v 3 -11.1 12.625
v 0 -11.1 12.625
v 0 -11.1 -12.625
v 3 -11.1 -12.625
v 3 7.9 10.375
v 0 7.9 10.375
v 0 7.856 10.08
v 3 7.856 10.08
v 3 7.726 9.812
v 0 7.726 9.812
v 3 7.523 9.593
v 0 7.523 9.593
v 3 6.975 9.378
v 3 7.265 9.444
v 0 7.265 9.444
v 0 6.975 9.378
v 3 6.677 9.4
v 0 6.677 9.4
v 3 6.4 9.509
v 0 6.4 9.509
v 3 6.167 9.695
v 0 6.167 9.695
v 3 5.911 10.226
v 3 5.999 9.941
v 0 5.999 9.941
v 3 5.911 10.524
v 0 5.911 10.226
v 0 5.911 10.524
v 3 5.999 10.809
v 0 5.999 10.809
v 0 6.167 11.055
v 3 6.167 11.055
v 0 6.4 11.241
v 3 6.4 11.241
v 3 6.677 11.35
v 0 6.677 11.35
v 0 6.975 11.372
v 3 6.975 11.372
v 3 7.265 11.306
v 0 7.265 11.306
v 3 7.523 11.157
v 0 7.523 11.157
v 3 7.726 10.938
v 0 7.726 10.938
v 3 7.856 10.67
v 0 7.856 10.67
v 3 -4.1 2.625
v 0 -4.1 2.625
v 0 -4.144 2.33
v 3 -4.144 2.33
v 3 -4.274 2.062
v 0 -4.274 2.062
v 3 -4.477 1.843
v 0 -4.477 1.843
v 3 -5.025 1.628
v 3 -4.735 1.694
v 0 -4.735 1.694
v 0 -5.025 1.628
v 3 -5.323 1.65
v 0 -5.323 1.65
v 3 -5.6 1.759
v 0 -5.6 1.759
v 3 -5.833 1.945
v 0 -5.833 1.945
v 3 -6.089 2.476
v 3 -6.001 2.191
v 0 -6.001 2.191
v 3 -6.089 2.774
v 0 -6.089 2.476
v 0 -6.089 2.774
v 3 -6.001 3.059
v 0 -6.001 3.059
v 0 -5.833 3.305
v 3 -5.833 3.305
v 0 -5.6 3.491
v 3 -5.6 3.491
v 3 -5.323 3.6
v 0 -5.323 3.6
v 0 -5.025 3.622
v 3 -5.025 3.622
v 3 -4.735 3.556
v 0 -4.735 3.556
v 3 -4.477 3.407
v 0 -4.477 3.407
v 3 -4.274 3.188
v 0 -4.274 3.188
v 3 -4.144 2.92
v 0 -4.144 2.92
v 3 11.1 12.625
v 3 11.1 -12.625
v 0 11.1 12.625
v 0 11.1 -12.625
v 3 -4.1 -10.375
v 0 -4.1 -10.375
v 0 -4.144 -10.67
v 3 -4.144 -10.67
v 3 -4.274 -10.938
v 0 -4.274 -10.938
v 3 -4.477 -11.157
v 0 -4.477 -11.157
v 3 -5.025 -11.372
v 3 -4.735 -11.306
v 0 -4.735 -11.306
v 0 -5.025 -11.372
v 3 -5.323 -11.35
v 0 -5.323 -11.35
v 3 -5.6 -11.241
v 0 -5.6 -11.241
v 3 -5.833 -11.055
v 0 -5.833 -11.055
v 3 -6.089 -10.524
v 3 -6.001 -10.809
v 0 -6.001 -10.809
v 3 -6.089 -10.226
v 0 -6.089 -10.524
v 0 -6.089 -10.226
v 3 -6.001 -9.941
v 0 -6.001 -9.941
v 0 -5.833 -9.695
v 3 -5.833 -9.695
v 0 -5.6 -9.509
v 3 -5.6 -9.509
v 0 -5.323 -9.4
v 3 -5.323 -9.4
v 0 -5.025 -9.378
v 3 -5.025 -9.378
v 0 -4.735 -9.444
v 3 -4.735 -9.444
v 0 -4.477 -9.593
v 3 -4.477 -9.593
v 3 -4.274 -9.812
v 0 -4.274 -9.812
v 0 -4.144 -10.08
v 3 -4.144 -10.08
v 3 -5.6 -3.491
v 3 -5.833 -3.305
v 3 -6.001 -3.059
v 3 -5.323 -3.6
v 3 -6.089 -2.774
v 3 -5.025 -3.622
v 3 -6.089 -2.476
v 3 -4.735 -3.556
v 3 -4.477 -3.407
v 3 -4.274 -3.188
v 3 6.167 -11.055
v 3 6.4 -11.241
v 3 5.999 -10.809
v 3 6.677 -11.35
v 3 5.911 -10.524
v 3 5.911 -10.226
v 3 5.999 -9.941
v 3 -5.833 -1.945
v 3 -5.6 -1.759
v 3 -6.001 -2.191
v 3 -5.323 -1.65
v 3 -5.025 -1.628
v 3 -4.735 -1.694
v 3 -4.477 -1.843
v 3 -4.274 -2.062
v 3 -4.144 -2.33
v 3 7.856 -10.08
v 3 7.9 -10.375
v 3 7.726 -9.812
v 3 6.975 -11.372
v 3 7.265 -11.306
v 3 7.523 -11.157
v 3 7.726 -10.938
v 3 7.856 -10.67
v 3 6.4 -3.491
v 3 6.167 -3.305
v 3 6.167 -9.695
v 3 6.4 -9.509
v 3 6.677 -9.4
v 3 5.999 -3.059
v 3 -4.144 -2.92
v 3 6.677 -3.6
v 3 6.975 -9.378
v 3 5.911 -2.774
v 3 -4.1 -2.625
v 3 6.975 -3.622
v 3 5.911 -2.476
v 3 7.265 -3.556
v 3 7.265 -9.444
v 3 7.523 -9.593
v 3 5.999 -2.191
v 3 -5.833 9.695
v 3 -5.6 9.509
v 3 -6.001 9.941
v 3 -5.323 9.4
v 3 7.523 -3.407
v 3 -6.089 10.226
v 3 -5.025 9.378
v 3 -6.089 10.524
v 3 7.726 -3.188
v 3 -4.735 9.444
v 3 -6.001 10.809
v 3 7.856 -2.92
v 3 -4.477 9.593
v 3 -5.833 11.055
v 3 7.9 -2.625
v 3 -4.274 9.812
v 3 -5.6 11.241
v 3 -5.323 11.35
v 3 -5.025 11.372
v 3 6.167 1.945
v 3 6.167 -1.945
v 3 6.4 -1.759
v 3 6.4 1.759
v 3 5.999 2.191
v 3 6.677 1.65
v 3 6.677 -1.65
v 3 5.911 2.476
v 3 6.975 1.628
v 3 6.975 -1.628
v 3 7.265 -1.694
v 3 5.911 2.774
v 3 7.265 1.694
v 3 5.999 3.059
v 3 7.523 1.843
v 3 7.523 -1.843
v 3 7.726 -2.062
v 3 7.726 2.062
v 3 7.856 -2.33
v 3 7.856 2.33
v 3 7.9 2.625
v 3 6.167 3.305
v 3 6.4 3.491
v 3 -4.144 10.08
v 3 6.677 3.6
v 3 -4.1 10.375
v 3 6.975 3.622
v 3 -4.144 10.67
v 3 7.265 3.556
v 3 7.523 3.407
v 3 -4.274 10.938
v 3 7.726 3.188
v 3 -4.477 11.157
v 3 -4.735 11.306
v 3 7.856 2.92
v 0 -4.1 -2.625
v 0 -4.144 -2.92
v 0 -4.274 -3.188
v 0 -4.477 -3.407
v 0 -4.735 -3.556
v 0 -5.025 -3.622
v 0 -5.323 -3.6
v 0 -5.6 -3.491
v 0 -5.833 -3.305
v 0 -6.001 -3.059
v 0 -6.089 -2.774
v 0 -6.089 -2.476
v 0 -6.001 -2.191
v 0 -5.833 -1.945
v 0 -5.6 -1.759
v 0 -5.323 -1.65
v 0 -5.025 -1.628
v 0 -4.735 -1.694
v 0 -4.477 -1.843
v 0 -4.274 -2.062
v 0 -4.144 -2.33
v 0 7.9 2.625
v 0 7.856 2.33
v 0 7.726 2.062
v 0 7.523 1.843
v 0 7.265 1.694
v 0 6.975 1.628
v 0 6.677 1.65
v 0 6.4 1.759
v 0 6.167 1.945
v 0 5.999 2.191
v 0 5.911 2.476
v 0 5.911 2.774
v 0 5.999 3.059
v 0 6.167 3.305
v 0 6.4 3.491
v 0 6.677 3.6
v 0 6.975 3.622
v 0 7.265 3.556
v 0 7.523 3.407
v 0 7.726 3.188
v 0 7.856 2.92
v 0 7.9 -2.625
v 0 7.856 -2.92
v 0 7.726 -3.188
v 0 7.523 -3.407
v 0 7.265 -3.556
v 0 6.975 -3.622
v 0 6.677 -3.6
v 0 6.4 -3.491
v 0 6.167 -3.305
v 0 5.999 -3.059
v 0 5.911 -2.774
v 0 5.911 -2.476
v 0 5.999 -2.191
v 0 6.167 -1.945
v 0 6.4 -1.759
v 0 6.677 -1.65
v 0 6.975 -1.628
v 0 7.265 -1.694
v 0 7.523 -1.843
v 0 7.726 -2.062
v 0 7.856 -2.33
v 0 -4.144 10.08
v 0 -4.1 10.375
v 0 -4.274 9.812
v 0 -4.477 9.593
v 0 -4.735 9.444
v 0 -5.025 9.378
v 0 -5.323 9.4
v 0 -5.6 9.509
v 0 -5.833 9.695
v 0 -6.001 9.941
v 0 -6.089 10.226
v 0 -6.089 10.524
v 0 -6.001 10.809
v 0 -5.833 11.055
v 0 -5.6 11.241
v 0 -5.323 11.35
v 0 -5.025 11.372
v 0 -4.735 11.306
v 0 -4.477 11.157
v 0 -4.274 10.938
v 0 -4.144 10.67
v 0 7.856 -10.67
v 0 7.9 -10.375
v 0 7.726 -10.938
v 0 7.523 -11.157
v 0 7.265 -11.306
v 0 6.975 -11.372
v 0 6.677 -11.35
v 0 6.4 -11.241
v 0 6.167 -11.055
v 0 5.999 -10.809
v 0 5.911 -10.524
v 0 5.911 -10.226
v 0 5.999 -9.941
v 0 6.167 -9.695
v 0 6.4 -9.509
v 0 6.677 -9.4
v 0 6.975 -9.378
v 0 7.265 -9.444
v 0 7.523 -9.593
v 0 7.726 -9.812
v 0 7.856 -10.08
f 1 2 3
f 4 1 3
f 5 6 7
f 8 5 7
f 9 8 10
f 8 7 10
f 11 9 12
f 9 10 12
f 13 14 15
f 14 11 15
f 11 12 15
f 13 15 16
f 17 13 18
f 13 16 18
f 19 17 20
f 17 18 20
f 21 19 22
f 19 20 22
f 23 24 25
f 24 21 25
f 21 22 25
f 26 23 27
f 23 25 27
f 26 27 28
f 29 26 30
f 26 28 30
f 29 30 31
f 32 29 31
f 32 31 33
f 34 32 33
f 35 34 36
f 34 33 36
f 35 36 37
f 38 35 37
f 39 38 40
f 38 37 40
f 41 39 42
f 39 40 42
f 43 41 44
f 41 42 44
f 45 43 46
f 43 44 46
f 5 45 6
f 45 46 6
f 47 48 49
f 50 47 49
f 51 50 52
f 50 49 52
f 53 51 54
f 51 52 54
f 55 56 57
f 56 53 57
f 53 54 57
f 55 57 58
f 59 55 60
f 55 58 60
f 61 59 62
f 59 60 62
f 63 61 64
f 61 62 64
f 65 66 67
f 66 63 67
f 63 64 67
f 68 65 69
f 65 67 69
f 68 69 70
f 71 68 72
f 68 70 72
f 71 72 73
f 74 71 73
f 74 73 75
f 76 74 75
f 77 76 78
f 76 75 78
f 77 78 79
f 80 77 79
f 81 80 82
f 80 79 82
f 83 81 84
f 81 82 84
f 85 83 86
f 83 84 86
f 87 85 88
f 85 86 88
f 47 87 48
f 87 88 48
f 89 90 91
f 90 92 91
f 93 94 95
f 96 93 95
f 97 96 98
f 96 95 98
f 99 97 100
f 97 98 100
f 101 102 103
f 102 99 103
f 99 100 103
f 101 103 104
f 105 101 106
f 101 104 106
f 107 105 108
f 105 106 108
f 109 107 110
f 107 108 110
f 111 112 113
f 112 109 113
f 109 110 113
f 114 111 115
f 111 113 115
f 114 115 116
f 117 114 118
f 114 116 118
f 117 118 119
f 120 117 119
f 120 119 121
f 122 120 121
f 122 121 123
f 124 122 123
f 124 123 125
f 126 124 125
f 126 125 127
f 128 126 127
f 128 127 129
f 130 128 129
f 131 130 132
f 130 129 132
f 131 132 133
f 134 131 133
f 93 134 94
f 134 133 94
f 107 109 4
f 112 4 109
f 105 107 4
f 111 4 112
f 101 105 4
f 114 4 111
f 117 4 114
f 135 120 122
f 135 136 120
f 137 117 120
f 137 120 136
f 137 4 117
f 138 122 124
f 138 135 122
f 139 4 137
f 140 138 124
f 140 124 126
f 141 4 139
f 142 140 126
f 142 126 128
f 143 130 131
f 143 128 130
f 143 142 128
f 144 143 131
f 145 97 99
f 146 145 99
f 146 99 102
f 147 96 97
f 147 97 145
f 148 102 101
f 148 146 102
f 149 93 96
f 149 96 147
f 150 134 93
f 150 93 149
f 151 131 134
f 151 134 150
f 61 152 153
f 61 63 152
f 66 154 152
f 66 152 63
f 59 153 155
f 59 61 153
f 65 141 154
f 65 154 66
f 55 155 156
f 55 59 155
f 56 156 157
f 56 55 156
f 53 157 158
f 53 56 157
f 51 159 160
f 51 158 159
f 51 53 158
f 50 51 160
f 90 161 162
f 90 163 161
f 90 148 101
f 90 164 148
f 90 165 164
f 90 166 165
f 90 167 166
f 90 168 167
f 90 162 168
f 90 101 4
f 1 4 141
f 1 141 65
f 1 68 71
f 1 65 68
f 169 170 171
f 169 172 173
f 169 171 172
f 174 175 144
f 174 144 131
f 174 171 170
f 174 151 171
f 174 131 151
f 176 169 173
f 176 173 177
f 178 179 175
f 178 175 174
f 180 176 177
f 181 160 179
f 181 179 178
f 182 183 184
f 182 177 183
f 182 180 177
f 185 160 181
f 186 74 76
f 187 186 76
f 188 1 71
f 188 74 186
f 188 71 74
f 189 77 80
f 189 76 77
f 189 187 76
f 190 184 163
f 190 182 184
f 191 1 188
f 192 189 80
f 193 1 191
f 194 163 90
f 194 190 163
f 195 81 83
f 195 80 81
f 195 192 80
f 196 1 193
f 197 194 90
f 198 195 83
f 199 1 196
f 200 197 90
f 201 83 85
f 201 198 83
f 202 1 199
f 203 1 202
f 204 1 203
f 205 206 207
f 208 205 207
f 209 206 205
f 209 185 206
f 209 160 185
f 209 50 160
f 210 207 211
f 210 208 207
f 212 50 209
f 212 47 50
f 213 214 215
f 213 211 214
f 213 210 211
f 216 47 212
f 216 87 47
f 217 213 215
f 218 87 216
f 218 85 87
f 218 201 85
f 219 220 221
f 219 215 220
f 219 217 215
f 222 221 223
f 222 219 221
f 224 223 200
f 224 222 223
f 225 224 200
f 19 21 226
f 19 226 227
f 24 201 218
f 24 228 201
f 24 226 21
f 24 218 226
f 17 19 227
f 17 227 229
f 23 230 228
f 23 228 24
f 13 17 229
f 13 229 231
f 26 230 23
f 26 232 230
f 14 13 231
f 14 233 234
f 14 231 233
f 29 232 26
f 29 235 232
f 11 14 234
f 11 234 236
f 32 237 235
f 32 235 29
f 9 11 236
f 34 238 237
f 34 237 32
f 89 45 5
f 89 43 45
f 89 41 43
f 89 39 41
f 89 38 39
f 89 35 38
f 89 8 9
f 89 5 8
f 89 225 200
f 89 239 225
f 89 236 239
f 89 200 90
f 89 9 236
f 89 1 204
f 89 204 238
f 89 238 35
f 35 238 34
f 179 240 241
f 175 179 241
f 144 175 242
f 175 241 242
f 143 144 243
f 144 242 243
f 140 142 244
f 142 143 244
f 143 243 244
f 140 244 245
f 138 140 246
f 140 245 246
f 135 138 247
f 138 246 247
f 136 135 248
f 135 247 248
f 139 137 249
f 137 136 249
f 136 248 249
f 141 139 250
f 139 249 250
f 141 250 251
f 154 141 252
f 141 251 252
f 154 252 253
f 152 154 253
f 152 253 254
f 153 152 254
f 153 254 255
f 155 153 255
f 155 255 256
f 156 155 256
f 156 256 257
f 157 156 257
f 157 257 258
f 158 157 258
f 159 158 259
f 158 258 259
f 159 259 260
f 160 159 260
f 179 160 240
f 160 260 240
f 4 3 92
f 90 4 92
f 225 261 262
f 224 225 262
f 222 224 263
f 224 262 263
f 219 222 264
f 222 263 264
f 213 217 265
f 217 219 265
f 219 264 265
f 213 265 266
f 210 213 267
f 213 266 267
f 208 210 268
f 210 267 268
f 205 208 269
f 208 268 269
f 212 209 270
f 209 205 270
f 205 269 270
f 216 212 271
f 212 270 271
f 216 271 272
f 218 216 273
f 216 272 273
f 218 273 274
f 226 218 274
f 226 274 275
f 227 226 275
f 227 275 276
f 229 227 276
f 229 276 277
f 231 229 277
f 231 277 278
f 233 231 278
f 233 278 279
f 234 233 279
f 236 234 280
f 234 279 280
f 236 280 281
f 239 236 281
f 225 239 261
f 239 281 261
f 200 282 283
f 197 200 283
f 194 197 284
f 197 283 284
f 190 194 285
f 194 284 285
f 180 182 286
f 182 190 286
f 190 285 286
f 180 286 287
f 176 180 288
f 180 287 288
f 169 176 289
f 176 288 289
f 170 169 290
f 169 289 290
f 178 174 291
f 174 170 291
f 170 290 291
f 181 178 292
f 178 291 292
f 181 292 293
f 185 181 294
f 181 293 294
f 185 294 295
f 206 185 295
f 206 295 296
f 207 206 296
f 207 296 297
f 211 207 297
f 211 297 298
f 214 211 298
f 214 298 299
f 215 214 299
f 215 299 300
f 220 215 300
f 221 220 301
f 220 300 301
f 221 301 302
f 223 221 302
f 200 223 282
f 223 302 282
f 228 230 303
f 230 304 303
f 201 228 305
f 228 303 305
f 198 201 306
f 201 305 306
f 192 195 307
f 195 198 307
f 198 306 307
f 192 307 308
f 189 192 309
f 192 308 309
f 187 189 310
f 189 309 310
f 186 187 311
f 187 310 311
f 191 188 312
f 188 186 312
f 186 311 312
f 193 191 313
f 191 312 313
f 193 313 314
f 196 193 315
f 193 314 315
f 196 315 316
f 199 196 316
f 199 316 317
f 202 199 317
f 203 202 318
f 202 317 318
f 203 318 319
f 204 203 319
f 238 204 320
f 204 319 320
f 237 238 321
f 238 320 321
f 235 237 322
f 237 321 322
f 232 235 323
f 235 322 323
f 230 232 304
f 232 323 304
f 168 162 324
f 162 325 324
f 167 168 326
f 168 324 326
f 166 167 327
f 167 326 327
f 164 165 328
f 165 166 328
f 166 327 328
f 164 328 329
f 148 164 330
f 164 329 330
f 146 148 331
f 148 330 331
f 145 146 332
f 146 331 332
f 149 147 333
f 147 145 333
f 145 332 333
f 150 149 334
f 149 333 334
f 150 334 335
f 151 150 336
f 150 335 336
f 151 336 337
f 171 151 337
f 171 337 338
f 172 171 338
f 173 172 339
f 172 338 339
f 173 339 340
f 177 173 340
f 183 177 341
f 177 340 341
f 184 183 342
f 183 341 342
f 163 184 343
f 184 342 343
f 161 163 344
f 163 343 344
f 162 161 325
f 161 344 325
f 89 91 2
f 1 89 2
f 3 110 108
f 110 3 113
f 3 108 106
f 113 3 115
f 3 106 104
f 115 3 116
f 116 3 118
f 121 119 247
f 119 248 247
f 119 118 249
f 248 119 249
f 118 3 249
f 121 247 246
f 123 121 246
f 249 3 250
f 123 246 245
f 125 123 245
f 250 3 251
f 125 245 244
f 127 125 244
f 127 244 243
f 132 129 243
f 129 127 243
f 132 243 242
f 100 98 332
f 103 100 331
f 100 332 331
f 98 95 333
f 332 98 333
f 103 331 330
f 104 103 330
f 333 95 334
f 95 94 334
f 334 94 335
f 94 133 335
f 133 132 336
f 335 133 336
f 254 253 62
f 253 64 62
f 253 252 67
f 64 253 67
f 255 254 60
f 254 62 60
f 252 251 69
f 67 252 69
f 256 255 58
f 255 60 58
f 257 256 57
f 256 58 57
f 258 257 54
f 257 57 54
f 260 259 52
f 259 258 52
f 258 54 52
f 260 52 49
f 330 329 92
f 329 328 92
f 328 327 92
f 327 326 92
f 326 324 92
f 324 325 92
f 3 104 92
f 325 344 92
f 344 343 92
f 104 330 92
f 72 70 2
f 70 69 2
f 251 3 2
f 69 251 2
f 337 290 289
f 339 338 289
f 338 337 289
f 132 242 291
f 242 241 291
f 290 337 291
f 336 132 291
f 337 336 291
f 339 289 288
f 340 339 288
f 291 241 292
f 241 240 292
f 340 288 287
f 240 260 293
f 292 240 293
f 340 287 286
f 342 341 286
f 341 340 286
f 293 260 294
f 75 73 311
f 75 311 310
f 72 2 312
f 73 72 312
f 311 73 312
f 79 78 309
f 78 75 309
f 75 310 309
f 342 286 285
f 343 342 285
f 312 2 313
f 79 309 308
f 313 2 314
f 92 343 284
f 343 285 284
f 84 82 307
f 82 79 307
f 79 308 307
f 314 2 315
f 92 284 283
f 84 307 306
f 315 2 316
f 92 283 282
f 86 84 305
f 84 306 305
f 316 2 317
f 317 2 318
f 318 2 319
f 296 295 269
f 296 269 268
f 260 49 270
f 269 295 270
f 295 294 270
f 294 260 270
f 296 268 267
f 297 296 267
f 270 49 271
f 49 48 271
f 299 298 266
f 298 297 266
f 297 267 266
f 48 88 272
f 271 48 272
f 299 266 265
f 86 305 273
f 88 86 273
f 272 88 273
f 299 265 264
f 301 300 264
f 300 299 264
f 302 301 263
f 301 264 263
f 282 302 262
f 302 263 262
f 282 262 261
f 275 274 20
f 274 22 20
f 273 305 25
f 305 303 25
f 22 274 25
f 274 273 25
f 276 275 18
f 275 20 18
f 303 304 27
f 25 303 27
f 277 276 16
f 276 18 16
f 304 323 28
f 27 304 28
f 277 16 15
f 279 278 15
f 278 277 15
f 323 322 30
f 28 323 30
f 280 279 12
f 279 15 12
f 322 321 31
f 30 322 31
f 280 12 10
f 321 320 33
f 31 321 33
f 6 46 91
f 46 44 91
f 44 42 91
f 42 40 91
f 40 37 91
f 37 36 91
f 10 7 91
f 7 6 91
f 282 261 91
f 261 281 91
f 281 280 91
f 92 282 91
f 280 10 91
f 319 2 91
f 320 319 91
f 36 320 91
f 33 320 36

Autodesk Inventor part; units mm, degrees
ref_plane "YZ Plane" through (0, 0, 0) normal (1, 0, 0) x (0, 1, 0)
ref_plane "XZ Plane" through (0, 0, 0) normal (0, 1, 0) x (-1, 0, 0)
ref_plane "XY Plane" through (0, 0, 0) normal (0, 0, 1) x (1, 0, 0)
sketch "Sketch1" plane through (0, 0, 0) normal (1, 0, 0) x (0, 1, 0)
  line L0 (11.1, 12.625) -> (-11.1, 12.625)
  line L1 (-11.1, 12.625) -> (-11.1, -12.625)
  line L2 (-11.1, -12.625) -> (11.1, -12.625)
  line L3 (11.1, -12.625) -> (11.1, 12.625)
  line L4 (7.1853, 0) -> (-6.35, 0) construction
  line L5 (0, 7.4808) -> (0, -6.6937) construction
  circle A0 centre (-5.1, 10.375) radius 1
  circle A1 centre (-5.1, 2.625) radius 1
  circle A2 centre (-5.1, -10.375) radius 1
  circle A3 centre (-5.1, -2.625) radius 1
  circle A4 centre (6.9, 10.375) radius 1
  circle A5 centre (6.9, -10.375) radius 1
  circle A6 centre (6.9, 2.625) radius 1
  circle A7 centre (6.9, -2.625) radius 1
  point P0 (0, 0)
  dimension "d0" = 22.2
  dimension "d1" = 25.25
  dimension "d2" = 2
  dimension "d3" = 6
  dimension "d4" = 2.25
  dimension "d5" = 2
  dimension "d6" = 10
  dimension "d9" = 2
  dimension "d10" = 4.2
  dimension "d14" = 2
  dimension "d15" = 2
extrude "Extrusion1" add sketch "Sketch1" along normal blind 3 contours L3 L2 L1 L0 | A6 | A7
extrude "Extrusion2" cut sketch "Sketch1" along normal blind 3 contours A6 | A7
properties part number "Konektor Lifter_3DPrint"
